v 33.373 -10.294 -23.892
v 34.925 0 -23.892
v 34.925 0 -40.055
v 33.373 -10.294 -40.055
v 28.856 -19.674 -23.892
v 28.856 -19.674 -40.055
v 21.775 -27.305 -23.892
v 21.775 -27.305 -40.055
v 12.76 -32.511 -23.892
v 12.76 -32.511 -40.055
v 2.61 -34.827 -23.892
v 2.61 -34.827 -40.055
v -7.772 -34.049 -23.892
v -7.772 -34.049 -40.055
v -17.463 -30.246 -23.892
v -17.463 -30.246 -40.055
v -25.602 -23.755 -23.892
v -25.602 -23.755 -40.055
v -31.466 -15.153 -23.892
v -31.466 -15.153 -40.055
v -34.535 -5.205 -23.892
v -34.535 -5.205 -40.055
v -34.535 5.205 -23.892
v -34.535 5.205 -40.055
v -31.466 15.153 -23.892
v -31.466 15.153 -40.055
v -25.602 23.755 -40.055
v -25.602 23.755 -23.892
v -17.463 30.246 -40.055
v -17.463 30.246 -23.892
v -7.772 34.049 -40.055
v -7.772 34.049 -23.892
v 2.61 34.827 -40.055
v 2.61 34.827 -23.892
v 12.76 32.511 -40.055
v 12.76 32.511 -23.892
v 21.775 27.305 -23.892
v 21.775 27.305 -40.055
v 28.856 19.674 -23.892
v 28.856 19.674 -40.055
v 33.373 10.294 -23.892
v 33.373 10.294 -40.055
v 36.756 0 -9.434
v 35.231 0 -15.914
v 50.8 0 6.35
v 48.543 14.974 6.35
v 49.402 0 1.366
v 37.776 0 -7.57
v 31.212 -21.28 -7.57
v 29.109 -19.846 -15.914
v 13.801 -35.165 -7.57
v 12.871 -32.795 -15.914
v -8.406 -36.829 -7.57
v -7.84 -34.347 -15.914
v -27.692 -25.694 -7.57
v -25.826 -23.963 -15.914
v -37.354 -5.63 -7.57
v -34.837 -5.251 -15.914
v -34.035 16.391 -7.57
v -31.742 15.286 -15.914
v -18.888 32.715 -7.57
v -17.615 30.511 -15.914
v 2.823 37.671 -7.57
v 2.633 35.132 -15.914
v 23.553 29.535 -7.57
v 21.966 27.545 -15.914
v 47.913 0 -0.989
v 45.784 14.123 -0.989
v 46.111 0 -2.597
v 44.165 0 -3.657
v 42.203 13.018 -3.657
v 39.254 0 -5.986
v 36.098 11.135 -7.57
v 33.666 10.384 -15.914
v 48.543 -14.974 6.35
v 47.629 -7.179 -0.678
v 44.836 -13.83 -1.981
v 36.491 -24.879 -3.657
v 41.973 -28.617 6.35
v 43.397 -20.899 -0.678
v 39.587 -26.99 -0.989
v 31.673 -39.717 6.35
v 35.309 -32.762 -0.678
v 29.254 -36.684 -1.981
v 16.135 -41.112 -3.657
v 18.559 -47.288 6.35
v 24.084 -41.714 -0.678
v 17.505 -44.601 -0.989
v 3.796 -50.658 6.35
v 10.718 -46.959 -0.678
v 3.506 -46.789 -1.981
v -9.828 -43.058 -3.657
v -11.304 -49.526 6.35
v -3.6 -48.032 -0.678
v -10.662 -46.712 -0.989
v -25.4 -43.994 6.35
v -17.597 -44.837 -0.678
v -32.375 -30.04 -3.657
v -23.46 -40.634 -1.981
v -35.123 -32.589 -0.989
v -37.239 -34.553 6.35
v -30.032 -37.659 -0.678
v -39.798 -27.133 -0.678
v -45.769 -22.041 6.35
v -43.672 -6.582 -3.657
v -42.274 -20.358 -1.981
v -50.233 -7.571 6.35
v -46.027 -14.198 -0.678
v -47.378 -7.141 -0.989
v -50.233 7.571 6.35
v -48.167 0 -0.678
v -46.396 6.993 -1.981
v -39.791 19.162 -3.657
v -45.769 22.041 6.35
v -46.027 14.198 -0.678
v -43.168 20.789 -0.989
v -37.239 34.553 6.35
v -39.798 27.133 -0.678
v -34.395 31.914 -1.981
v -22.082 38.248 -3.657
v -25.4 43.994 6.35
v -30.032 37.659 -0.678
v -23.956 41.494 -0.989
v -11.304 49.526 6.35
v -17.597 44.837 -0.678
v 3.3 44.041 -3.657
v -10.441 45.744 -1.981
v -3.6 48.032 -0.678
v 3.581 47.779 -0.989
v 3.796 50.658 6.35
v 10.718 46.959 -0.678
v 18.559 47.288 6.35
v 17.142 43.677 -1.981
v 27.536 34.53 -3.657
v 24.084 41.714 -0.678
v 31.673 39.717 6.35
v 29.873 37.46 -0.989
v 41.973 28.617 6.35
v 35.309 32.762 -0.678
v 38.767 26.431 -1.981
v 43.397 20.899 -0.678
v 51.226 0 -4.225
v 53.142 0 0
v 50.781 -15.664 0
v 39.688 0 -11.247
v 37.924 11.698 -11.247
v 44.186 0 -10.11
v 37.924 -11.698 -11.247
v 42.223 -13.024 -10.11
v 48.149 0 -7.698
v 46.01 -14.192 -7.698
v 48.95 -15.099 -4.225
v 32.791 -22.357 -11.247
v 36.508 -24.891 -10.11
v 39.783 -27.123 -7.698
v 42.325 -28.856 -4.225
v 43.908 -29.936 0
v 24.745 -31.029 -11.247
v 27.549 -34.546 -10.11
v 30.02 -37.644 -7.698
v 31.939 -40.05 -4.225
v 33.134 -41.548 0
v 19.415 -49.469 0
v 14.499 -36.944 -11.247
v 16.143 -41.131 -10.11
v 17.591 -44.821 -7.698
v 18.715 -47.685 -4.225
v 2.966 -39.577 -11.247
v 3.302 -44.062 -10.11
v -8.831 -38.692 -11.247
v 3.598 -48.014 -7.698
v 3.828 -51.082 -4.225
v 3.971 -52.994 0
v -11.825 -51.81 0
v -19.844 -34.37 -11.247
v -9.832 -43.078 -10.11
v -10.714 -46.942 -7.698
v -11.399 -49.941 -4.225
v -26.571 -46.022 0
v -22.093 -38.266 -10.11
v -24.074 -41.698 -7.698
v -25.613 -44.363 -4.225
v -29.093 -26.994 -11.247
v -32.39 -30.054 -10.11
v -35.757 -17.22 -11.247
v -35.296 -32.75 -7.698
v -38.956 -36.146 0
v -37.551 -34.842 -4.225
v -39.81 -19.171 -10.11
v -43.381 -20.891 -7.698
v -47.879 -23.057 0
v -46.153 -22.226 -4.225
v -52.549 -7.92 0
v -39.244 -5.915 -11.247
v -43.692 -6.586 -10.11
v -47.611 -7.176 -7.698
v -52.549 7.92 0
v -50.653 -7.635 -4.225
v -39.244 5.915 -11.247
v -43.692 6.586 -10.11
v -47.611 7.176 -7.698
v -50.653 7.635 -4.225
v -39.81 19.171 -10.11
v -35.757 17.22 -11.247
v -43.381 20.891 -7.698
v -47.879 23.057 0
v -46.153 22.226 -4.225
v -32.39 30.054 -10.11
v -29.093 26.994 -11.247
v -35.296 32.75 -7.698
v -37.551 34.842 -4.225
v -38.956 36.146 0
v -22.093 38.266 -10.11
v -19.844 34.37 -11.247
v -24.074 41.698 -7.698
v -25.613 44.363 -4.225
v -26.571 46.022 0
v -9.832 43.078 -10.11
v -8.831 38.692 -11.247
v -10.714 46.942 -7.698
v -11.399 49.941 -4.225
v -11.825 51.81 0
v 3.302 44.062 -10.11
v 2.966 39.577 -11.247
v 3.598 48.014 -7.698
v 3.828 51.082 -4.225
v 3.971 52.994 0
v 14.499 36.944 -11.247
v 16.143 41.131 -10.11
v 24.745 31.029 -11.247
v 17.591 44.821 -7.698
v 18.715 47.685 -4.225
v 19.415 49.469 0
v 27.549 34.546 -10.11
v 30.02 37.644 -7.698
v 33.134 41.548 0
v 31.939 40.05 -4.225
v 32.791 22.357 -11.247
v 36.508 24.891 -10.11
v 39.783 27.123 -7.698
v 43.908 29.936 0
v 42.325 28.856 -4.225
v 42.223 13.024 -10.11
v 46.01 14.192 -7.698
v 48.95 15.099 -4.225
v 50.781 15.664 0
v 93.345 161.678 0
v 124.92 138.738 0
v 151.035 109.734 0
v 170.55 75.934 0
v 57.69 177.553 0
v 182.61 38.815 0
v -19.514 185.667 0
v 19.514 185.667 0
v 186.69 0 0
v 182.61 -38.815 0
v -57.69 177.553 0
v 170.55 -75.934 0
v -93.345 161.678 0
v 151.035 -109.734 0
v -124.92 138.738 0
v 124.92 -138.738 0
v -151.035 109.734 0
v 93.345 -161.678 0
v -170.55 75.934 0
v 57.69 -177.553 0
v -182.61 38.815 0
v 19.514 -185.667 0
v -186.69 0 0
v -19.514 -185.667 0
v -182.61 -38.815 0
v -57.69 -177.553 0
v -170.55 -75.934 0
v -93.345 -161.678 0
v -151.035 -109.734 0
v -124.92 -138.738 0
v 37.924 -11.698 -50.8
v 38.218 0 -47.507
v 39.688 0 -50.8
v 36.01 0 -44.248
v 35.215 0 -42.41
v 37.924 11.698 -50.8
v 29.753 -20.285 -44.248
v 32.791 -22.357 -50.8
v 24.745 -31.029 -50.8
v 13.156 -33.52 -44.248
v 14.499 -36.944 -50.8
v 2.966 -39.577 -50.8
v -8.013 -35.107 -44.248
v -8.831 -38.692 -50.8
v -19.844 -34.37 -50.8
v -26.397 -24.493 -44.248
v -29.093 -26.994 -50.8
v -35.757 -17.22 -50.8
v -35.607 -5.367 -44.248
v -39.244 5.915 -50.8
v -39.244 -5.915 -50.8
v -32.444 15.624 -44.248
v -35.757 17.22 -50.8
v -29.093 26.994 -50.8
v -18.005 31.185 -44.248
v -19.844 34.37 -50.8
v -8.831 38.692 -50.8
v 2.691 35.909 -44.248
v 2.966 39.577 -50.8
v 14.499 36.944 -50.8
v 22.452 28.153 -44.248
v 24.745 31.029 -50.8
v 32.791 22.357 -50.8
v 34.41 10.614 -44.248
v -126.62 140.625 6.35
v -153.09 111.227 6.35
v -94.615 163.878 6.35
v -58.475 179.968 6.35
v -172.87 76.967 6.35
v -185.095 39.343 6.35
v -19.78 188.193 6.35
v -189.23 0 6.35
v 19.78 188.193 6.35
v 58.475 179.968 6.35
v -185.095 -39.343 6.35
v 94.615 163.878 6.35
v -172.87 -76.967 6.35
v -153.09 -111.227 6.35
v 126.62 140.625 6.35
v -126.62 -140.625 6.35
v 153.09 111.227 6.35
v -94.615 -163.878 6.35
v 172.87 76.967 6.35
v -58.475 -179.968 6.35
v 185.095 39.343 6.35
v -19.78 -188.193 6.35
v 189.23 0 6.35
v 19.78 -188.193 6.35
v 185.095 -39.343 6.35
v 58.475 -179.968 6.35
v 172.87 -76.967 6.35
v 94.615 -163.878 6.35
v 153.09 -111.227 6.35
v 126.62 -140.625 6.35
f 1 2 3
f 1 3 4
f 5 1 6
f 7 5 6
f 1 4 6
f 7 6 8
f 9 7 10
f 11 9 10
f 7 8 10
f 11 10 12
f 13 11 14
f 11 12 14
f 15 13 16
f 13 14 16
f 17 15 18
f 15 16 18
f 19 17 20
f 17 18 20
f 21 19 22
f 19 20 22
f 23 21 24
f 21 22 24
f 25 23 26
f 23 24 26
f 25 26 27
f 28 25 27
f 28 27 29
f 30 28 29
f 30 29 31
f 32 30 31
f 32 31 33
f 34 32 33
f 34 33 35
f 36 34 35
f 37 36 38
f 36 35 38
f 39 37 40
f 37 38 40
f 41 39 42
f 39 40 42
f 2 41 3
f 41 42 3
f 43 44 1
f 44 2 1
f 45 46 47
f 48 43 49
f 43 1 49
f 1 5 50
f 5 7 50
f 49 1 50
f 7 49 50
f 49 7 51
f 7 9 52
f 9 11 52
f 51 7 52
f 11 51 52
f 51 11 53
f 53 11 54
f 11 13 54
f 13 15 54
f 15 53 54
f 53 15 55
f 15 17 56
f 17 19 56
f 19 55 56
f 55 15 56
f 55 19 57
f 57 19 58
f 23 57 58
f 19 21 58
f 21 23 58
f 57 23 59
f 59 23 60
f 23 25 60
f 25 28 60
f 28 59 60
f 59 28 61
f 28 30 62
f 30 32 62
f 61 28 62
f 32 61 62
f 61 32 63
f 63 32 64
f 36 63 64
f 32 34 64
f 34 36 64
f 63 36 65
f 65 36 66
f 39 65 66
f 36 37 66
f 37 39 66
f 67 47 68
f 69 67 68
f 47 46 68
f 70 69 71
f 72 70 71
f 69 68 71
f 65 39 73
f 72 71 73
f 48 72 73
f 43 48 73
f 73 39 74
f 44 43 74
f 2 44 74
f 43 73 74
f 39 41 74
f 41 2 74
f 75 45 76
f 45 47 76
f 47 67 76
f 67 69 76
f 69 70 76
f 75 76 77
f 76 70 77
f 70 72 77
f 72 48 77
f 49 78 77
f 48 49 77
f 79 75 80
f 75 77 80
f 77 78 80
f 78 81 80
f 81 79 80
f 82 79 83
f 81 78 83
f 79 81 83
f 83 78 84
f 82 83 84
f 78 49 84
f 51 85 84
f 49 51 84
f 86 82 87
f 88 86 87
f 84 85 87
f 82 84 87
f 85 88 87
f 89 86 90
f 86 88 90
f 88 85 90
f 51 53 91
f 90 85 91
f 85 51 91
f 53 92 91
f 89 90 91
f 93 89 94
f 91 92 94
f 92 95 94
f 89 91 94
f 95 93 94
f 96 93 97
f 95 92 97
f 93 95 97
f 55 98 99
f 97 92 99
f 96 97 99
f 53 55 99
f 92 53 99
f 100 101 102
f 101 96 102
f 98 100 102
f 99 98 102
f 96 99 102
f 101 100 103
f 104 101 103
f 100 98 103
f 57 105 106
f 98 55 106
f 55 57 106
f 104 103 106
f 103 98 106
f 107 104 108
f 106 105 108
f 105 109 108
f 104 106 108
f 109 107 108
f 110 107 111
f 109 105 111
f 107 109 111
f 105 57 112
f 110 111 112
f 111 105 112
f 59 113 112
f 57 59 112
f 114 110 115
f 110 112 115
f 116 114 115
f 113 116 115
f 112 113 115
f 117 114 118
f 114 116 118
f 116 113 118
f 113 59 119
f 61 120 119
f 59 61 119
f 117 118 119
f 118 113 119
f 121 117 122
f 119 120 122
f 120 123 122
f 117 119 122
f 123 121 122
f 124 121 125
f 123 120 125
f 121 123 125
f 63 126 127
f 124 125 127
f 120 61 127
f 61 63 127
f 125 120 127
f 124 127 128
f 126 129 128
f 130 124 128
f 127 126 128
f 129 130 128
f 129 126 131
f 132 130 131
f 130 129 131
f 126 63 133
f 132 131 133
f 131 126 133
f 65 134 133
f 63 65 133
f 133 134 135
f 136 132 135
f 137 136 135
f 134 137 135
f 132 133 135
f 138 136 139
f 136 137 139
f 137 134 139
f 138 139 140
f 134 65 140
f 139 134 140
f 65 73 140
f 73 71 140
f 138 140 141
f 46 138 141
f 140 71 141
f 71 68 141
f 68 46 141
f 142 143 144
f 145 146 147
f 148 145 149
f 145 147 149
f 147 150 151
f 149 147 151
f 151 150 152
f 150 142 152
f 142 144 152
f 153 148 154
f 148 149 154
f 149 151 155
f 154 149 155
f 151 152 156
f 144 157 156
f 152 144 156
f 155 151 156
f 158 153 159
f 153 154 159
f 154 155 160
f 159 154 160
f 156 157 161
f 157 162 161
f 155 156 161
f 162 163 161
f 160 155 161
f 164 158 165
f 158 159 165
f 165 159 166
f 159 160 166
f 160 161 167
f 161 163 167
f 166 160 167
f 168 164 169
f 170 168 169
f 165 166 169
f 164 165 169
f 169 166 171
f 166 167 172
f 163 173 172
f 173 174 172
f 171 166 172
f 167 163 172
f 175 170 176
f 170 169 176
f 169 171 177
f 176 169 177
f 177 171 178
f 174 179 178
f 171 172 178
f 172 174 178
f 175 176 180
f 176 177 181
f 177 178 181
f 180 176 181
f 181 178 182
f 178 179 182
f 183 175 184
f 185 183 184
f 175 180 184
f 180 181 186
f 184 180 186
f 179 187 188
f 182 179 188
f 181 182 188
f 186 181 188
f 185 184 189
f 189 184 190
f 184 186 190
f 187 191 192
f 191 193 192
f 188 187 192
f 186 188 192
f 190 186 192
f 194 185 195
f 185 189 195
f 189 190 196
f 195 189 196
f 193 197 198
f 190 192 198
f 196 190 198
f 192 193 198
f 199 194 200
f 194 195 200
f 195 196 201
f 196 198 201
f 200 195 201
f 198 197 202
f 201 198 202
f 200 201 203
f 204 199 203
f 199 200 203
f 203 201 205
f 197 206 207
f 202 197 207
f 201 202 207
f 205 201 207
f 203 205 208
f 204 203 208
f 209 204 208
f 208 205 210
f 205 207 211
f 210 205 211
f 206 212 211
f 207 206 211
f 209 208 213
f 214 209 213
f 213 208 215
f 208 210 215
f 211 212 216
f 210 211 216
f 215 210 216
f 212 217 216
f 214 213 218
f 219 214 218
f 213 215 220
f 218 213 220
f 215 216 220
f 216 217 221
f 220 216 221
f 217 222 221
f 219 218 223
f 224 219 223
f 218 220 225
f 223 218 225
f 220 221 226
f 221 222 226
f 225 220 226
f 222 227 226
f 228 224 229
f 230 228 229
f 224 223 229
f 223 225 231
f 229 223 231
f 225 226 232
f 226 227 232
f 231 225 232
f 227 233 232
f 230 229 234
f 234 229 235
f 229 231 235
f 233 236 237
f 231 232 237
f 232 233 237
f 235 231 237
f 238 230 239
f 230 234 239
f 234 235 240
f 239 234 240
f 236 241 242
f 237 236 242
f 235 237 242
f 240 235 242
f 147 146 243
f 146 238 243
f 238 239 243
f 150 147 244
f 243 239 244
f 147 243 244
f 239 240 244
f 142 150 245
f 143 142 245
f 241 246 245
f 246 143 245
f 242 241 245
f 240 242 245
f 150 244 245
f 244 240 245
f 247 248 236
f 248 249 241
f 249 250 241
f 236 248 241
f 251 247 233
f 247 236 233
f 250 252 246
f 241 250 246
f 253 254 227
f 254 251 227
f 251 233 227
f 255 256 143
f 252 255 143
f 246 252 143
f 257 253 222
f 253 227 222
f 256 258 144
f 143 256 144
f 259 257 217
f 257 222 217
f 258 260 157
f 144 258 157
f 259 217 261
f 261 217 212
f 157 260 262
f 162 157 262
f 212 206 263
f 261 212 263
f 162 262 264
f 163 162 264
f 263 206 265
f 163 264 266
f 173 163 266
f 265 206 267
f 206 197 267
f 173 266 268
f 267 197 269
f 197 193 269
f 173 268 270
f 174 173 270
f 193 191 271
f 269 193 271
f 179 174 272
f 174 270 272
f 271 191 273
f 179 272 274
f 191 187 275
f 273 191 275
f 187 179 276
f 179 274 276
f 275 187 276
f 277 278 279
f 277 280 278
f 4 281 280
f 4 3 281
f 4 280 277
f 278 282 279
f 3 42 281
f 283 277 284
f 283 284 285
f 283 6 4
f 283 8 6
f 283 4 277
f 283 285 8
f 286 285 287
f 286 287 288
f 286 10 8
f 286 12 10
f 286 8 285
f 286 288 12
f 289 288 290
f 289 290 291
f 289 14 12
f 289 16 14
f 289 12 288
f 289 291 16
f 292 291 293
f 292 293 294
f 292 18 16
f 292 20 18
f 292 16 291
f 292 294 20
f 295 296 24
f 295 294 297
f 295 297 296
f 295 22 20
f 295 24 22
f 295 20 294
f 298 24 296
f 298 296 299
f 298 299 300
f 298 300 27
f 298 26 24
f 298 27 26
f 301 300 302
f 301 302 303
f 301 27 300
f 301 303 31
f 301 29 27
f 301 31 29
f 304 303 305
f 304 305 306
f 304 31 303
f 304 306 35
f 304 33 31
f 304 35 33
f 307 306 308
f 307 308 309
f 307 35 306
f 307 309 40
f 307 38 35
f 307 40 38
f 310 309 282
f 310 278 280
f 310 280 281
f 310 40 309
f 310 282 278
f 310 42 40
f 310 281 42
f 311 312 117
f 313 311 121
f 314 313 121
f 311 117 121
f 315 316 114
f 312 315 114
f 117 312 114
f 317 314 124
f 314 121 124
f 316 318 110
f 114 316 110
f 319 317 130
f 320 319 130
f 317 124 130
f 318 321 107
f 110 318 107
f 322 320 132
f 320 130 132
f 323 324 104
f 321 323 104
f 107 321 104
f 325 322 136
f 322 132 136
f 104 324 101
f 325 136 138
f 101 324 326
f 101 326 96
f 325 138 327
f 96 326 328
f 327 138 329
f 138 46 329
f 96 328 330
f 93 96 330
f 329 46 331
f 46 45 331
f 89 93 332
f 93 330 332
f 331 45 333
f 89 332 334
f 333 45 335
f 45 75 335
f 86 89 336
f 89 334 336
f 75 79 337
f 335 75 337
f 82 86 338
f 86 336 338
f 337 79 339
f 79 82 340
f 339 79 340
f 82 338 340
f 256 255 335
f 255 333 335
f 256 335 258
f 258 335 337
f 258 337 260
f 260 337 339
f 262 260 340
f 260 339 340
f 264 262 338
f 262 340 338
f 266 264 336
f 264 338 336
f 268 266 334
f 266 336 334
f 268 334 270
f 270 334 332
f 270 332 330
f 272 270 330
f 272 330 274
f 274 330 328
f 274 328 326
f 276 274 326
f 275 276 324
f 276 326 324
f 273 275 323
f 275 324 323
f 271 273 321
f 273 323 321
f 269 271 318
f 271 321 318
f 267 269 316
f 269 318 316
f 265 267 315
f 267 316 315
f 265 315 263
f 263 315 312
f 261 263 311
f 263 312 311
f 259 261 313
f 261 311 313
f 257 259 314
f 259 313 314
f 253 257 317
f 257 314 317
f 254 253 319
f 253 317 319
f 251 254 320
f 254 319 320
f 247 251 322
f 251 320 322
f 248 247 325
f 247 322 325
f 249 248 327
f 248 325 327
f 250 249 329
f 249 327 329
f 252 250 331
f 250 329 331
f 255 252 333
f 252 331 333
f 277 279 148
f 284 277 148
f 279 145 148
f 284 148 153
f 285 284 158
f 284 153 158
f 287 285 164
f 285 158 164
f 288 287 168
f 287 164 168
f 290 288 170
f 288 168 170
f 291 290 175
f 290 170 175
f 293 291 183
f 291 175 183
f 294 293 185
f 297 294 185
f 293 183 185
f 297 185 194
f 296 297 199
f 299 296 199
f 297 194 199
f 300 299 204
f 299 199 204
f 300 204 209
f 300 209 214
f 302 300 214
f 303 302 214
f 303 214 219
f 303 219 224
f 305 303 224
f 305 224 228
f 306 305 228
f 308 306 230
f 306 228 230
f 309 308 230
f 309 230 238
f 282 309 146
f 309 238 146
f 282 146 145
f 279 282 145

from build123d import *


with BuildPart() as f1:
    # F0 (on Front) → F1 (revolve)
    with BuildSketch(Plane.XZ):
        with BuildLine():
            ThreePointArc((39.6875, -11.2468861043), (48.1489607267, -7.6980115894), (53.1421005726, 0))
            Line((53.1421005726, 0), (186.69, 0))
            Line((186.69, 0), (189.23, 6.35))
            Line((189.23, 6.35), (50.8, 6.35))
            add(Edge.make_bspline(
                [(50.8, 6.35), (49.1728301439, -4.4232065161), (36.2611646426, -1.9466716062), (34.8222671813, -16.0190971942), (34.925, -23.8922853023)],
                knots=[0, 0, 0, 0, 0.4885222498, 1, 1, 1, 1], degree=3))
            Line((34.925, -23.8922853023), (34.925, -40.0551594794))
            add(Edge.make_bspline(
                [(39.6875, -50.8), (38.2820304334, -45.8264946938), (34.8677070156, -44.9470542371), (34.925, -40.0551594794)],
                knots=[0, 0, 0, 0, 11.75299979, 11.75299979, 11.75299979, 11.75299979], degree=3))
            Line((39.6875, -50.8), (39.6875, -11.2468861043))
        make_face()
    revolve(axis=Axis((0, 0, 2.4035767974), (0, 0, -1)))


solid = f1.part
